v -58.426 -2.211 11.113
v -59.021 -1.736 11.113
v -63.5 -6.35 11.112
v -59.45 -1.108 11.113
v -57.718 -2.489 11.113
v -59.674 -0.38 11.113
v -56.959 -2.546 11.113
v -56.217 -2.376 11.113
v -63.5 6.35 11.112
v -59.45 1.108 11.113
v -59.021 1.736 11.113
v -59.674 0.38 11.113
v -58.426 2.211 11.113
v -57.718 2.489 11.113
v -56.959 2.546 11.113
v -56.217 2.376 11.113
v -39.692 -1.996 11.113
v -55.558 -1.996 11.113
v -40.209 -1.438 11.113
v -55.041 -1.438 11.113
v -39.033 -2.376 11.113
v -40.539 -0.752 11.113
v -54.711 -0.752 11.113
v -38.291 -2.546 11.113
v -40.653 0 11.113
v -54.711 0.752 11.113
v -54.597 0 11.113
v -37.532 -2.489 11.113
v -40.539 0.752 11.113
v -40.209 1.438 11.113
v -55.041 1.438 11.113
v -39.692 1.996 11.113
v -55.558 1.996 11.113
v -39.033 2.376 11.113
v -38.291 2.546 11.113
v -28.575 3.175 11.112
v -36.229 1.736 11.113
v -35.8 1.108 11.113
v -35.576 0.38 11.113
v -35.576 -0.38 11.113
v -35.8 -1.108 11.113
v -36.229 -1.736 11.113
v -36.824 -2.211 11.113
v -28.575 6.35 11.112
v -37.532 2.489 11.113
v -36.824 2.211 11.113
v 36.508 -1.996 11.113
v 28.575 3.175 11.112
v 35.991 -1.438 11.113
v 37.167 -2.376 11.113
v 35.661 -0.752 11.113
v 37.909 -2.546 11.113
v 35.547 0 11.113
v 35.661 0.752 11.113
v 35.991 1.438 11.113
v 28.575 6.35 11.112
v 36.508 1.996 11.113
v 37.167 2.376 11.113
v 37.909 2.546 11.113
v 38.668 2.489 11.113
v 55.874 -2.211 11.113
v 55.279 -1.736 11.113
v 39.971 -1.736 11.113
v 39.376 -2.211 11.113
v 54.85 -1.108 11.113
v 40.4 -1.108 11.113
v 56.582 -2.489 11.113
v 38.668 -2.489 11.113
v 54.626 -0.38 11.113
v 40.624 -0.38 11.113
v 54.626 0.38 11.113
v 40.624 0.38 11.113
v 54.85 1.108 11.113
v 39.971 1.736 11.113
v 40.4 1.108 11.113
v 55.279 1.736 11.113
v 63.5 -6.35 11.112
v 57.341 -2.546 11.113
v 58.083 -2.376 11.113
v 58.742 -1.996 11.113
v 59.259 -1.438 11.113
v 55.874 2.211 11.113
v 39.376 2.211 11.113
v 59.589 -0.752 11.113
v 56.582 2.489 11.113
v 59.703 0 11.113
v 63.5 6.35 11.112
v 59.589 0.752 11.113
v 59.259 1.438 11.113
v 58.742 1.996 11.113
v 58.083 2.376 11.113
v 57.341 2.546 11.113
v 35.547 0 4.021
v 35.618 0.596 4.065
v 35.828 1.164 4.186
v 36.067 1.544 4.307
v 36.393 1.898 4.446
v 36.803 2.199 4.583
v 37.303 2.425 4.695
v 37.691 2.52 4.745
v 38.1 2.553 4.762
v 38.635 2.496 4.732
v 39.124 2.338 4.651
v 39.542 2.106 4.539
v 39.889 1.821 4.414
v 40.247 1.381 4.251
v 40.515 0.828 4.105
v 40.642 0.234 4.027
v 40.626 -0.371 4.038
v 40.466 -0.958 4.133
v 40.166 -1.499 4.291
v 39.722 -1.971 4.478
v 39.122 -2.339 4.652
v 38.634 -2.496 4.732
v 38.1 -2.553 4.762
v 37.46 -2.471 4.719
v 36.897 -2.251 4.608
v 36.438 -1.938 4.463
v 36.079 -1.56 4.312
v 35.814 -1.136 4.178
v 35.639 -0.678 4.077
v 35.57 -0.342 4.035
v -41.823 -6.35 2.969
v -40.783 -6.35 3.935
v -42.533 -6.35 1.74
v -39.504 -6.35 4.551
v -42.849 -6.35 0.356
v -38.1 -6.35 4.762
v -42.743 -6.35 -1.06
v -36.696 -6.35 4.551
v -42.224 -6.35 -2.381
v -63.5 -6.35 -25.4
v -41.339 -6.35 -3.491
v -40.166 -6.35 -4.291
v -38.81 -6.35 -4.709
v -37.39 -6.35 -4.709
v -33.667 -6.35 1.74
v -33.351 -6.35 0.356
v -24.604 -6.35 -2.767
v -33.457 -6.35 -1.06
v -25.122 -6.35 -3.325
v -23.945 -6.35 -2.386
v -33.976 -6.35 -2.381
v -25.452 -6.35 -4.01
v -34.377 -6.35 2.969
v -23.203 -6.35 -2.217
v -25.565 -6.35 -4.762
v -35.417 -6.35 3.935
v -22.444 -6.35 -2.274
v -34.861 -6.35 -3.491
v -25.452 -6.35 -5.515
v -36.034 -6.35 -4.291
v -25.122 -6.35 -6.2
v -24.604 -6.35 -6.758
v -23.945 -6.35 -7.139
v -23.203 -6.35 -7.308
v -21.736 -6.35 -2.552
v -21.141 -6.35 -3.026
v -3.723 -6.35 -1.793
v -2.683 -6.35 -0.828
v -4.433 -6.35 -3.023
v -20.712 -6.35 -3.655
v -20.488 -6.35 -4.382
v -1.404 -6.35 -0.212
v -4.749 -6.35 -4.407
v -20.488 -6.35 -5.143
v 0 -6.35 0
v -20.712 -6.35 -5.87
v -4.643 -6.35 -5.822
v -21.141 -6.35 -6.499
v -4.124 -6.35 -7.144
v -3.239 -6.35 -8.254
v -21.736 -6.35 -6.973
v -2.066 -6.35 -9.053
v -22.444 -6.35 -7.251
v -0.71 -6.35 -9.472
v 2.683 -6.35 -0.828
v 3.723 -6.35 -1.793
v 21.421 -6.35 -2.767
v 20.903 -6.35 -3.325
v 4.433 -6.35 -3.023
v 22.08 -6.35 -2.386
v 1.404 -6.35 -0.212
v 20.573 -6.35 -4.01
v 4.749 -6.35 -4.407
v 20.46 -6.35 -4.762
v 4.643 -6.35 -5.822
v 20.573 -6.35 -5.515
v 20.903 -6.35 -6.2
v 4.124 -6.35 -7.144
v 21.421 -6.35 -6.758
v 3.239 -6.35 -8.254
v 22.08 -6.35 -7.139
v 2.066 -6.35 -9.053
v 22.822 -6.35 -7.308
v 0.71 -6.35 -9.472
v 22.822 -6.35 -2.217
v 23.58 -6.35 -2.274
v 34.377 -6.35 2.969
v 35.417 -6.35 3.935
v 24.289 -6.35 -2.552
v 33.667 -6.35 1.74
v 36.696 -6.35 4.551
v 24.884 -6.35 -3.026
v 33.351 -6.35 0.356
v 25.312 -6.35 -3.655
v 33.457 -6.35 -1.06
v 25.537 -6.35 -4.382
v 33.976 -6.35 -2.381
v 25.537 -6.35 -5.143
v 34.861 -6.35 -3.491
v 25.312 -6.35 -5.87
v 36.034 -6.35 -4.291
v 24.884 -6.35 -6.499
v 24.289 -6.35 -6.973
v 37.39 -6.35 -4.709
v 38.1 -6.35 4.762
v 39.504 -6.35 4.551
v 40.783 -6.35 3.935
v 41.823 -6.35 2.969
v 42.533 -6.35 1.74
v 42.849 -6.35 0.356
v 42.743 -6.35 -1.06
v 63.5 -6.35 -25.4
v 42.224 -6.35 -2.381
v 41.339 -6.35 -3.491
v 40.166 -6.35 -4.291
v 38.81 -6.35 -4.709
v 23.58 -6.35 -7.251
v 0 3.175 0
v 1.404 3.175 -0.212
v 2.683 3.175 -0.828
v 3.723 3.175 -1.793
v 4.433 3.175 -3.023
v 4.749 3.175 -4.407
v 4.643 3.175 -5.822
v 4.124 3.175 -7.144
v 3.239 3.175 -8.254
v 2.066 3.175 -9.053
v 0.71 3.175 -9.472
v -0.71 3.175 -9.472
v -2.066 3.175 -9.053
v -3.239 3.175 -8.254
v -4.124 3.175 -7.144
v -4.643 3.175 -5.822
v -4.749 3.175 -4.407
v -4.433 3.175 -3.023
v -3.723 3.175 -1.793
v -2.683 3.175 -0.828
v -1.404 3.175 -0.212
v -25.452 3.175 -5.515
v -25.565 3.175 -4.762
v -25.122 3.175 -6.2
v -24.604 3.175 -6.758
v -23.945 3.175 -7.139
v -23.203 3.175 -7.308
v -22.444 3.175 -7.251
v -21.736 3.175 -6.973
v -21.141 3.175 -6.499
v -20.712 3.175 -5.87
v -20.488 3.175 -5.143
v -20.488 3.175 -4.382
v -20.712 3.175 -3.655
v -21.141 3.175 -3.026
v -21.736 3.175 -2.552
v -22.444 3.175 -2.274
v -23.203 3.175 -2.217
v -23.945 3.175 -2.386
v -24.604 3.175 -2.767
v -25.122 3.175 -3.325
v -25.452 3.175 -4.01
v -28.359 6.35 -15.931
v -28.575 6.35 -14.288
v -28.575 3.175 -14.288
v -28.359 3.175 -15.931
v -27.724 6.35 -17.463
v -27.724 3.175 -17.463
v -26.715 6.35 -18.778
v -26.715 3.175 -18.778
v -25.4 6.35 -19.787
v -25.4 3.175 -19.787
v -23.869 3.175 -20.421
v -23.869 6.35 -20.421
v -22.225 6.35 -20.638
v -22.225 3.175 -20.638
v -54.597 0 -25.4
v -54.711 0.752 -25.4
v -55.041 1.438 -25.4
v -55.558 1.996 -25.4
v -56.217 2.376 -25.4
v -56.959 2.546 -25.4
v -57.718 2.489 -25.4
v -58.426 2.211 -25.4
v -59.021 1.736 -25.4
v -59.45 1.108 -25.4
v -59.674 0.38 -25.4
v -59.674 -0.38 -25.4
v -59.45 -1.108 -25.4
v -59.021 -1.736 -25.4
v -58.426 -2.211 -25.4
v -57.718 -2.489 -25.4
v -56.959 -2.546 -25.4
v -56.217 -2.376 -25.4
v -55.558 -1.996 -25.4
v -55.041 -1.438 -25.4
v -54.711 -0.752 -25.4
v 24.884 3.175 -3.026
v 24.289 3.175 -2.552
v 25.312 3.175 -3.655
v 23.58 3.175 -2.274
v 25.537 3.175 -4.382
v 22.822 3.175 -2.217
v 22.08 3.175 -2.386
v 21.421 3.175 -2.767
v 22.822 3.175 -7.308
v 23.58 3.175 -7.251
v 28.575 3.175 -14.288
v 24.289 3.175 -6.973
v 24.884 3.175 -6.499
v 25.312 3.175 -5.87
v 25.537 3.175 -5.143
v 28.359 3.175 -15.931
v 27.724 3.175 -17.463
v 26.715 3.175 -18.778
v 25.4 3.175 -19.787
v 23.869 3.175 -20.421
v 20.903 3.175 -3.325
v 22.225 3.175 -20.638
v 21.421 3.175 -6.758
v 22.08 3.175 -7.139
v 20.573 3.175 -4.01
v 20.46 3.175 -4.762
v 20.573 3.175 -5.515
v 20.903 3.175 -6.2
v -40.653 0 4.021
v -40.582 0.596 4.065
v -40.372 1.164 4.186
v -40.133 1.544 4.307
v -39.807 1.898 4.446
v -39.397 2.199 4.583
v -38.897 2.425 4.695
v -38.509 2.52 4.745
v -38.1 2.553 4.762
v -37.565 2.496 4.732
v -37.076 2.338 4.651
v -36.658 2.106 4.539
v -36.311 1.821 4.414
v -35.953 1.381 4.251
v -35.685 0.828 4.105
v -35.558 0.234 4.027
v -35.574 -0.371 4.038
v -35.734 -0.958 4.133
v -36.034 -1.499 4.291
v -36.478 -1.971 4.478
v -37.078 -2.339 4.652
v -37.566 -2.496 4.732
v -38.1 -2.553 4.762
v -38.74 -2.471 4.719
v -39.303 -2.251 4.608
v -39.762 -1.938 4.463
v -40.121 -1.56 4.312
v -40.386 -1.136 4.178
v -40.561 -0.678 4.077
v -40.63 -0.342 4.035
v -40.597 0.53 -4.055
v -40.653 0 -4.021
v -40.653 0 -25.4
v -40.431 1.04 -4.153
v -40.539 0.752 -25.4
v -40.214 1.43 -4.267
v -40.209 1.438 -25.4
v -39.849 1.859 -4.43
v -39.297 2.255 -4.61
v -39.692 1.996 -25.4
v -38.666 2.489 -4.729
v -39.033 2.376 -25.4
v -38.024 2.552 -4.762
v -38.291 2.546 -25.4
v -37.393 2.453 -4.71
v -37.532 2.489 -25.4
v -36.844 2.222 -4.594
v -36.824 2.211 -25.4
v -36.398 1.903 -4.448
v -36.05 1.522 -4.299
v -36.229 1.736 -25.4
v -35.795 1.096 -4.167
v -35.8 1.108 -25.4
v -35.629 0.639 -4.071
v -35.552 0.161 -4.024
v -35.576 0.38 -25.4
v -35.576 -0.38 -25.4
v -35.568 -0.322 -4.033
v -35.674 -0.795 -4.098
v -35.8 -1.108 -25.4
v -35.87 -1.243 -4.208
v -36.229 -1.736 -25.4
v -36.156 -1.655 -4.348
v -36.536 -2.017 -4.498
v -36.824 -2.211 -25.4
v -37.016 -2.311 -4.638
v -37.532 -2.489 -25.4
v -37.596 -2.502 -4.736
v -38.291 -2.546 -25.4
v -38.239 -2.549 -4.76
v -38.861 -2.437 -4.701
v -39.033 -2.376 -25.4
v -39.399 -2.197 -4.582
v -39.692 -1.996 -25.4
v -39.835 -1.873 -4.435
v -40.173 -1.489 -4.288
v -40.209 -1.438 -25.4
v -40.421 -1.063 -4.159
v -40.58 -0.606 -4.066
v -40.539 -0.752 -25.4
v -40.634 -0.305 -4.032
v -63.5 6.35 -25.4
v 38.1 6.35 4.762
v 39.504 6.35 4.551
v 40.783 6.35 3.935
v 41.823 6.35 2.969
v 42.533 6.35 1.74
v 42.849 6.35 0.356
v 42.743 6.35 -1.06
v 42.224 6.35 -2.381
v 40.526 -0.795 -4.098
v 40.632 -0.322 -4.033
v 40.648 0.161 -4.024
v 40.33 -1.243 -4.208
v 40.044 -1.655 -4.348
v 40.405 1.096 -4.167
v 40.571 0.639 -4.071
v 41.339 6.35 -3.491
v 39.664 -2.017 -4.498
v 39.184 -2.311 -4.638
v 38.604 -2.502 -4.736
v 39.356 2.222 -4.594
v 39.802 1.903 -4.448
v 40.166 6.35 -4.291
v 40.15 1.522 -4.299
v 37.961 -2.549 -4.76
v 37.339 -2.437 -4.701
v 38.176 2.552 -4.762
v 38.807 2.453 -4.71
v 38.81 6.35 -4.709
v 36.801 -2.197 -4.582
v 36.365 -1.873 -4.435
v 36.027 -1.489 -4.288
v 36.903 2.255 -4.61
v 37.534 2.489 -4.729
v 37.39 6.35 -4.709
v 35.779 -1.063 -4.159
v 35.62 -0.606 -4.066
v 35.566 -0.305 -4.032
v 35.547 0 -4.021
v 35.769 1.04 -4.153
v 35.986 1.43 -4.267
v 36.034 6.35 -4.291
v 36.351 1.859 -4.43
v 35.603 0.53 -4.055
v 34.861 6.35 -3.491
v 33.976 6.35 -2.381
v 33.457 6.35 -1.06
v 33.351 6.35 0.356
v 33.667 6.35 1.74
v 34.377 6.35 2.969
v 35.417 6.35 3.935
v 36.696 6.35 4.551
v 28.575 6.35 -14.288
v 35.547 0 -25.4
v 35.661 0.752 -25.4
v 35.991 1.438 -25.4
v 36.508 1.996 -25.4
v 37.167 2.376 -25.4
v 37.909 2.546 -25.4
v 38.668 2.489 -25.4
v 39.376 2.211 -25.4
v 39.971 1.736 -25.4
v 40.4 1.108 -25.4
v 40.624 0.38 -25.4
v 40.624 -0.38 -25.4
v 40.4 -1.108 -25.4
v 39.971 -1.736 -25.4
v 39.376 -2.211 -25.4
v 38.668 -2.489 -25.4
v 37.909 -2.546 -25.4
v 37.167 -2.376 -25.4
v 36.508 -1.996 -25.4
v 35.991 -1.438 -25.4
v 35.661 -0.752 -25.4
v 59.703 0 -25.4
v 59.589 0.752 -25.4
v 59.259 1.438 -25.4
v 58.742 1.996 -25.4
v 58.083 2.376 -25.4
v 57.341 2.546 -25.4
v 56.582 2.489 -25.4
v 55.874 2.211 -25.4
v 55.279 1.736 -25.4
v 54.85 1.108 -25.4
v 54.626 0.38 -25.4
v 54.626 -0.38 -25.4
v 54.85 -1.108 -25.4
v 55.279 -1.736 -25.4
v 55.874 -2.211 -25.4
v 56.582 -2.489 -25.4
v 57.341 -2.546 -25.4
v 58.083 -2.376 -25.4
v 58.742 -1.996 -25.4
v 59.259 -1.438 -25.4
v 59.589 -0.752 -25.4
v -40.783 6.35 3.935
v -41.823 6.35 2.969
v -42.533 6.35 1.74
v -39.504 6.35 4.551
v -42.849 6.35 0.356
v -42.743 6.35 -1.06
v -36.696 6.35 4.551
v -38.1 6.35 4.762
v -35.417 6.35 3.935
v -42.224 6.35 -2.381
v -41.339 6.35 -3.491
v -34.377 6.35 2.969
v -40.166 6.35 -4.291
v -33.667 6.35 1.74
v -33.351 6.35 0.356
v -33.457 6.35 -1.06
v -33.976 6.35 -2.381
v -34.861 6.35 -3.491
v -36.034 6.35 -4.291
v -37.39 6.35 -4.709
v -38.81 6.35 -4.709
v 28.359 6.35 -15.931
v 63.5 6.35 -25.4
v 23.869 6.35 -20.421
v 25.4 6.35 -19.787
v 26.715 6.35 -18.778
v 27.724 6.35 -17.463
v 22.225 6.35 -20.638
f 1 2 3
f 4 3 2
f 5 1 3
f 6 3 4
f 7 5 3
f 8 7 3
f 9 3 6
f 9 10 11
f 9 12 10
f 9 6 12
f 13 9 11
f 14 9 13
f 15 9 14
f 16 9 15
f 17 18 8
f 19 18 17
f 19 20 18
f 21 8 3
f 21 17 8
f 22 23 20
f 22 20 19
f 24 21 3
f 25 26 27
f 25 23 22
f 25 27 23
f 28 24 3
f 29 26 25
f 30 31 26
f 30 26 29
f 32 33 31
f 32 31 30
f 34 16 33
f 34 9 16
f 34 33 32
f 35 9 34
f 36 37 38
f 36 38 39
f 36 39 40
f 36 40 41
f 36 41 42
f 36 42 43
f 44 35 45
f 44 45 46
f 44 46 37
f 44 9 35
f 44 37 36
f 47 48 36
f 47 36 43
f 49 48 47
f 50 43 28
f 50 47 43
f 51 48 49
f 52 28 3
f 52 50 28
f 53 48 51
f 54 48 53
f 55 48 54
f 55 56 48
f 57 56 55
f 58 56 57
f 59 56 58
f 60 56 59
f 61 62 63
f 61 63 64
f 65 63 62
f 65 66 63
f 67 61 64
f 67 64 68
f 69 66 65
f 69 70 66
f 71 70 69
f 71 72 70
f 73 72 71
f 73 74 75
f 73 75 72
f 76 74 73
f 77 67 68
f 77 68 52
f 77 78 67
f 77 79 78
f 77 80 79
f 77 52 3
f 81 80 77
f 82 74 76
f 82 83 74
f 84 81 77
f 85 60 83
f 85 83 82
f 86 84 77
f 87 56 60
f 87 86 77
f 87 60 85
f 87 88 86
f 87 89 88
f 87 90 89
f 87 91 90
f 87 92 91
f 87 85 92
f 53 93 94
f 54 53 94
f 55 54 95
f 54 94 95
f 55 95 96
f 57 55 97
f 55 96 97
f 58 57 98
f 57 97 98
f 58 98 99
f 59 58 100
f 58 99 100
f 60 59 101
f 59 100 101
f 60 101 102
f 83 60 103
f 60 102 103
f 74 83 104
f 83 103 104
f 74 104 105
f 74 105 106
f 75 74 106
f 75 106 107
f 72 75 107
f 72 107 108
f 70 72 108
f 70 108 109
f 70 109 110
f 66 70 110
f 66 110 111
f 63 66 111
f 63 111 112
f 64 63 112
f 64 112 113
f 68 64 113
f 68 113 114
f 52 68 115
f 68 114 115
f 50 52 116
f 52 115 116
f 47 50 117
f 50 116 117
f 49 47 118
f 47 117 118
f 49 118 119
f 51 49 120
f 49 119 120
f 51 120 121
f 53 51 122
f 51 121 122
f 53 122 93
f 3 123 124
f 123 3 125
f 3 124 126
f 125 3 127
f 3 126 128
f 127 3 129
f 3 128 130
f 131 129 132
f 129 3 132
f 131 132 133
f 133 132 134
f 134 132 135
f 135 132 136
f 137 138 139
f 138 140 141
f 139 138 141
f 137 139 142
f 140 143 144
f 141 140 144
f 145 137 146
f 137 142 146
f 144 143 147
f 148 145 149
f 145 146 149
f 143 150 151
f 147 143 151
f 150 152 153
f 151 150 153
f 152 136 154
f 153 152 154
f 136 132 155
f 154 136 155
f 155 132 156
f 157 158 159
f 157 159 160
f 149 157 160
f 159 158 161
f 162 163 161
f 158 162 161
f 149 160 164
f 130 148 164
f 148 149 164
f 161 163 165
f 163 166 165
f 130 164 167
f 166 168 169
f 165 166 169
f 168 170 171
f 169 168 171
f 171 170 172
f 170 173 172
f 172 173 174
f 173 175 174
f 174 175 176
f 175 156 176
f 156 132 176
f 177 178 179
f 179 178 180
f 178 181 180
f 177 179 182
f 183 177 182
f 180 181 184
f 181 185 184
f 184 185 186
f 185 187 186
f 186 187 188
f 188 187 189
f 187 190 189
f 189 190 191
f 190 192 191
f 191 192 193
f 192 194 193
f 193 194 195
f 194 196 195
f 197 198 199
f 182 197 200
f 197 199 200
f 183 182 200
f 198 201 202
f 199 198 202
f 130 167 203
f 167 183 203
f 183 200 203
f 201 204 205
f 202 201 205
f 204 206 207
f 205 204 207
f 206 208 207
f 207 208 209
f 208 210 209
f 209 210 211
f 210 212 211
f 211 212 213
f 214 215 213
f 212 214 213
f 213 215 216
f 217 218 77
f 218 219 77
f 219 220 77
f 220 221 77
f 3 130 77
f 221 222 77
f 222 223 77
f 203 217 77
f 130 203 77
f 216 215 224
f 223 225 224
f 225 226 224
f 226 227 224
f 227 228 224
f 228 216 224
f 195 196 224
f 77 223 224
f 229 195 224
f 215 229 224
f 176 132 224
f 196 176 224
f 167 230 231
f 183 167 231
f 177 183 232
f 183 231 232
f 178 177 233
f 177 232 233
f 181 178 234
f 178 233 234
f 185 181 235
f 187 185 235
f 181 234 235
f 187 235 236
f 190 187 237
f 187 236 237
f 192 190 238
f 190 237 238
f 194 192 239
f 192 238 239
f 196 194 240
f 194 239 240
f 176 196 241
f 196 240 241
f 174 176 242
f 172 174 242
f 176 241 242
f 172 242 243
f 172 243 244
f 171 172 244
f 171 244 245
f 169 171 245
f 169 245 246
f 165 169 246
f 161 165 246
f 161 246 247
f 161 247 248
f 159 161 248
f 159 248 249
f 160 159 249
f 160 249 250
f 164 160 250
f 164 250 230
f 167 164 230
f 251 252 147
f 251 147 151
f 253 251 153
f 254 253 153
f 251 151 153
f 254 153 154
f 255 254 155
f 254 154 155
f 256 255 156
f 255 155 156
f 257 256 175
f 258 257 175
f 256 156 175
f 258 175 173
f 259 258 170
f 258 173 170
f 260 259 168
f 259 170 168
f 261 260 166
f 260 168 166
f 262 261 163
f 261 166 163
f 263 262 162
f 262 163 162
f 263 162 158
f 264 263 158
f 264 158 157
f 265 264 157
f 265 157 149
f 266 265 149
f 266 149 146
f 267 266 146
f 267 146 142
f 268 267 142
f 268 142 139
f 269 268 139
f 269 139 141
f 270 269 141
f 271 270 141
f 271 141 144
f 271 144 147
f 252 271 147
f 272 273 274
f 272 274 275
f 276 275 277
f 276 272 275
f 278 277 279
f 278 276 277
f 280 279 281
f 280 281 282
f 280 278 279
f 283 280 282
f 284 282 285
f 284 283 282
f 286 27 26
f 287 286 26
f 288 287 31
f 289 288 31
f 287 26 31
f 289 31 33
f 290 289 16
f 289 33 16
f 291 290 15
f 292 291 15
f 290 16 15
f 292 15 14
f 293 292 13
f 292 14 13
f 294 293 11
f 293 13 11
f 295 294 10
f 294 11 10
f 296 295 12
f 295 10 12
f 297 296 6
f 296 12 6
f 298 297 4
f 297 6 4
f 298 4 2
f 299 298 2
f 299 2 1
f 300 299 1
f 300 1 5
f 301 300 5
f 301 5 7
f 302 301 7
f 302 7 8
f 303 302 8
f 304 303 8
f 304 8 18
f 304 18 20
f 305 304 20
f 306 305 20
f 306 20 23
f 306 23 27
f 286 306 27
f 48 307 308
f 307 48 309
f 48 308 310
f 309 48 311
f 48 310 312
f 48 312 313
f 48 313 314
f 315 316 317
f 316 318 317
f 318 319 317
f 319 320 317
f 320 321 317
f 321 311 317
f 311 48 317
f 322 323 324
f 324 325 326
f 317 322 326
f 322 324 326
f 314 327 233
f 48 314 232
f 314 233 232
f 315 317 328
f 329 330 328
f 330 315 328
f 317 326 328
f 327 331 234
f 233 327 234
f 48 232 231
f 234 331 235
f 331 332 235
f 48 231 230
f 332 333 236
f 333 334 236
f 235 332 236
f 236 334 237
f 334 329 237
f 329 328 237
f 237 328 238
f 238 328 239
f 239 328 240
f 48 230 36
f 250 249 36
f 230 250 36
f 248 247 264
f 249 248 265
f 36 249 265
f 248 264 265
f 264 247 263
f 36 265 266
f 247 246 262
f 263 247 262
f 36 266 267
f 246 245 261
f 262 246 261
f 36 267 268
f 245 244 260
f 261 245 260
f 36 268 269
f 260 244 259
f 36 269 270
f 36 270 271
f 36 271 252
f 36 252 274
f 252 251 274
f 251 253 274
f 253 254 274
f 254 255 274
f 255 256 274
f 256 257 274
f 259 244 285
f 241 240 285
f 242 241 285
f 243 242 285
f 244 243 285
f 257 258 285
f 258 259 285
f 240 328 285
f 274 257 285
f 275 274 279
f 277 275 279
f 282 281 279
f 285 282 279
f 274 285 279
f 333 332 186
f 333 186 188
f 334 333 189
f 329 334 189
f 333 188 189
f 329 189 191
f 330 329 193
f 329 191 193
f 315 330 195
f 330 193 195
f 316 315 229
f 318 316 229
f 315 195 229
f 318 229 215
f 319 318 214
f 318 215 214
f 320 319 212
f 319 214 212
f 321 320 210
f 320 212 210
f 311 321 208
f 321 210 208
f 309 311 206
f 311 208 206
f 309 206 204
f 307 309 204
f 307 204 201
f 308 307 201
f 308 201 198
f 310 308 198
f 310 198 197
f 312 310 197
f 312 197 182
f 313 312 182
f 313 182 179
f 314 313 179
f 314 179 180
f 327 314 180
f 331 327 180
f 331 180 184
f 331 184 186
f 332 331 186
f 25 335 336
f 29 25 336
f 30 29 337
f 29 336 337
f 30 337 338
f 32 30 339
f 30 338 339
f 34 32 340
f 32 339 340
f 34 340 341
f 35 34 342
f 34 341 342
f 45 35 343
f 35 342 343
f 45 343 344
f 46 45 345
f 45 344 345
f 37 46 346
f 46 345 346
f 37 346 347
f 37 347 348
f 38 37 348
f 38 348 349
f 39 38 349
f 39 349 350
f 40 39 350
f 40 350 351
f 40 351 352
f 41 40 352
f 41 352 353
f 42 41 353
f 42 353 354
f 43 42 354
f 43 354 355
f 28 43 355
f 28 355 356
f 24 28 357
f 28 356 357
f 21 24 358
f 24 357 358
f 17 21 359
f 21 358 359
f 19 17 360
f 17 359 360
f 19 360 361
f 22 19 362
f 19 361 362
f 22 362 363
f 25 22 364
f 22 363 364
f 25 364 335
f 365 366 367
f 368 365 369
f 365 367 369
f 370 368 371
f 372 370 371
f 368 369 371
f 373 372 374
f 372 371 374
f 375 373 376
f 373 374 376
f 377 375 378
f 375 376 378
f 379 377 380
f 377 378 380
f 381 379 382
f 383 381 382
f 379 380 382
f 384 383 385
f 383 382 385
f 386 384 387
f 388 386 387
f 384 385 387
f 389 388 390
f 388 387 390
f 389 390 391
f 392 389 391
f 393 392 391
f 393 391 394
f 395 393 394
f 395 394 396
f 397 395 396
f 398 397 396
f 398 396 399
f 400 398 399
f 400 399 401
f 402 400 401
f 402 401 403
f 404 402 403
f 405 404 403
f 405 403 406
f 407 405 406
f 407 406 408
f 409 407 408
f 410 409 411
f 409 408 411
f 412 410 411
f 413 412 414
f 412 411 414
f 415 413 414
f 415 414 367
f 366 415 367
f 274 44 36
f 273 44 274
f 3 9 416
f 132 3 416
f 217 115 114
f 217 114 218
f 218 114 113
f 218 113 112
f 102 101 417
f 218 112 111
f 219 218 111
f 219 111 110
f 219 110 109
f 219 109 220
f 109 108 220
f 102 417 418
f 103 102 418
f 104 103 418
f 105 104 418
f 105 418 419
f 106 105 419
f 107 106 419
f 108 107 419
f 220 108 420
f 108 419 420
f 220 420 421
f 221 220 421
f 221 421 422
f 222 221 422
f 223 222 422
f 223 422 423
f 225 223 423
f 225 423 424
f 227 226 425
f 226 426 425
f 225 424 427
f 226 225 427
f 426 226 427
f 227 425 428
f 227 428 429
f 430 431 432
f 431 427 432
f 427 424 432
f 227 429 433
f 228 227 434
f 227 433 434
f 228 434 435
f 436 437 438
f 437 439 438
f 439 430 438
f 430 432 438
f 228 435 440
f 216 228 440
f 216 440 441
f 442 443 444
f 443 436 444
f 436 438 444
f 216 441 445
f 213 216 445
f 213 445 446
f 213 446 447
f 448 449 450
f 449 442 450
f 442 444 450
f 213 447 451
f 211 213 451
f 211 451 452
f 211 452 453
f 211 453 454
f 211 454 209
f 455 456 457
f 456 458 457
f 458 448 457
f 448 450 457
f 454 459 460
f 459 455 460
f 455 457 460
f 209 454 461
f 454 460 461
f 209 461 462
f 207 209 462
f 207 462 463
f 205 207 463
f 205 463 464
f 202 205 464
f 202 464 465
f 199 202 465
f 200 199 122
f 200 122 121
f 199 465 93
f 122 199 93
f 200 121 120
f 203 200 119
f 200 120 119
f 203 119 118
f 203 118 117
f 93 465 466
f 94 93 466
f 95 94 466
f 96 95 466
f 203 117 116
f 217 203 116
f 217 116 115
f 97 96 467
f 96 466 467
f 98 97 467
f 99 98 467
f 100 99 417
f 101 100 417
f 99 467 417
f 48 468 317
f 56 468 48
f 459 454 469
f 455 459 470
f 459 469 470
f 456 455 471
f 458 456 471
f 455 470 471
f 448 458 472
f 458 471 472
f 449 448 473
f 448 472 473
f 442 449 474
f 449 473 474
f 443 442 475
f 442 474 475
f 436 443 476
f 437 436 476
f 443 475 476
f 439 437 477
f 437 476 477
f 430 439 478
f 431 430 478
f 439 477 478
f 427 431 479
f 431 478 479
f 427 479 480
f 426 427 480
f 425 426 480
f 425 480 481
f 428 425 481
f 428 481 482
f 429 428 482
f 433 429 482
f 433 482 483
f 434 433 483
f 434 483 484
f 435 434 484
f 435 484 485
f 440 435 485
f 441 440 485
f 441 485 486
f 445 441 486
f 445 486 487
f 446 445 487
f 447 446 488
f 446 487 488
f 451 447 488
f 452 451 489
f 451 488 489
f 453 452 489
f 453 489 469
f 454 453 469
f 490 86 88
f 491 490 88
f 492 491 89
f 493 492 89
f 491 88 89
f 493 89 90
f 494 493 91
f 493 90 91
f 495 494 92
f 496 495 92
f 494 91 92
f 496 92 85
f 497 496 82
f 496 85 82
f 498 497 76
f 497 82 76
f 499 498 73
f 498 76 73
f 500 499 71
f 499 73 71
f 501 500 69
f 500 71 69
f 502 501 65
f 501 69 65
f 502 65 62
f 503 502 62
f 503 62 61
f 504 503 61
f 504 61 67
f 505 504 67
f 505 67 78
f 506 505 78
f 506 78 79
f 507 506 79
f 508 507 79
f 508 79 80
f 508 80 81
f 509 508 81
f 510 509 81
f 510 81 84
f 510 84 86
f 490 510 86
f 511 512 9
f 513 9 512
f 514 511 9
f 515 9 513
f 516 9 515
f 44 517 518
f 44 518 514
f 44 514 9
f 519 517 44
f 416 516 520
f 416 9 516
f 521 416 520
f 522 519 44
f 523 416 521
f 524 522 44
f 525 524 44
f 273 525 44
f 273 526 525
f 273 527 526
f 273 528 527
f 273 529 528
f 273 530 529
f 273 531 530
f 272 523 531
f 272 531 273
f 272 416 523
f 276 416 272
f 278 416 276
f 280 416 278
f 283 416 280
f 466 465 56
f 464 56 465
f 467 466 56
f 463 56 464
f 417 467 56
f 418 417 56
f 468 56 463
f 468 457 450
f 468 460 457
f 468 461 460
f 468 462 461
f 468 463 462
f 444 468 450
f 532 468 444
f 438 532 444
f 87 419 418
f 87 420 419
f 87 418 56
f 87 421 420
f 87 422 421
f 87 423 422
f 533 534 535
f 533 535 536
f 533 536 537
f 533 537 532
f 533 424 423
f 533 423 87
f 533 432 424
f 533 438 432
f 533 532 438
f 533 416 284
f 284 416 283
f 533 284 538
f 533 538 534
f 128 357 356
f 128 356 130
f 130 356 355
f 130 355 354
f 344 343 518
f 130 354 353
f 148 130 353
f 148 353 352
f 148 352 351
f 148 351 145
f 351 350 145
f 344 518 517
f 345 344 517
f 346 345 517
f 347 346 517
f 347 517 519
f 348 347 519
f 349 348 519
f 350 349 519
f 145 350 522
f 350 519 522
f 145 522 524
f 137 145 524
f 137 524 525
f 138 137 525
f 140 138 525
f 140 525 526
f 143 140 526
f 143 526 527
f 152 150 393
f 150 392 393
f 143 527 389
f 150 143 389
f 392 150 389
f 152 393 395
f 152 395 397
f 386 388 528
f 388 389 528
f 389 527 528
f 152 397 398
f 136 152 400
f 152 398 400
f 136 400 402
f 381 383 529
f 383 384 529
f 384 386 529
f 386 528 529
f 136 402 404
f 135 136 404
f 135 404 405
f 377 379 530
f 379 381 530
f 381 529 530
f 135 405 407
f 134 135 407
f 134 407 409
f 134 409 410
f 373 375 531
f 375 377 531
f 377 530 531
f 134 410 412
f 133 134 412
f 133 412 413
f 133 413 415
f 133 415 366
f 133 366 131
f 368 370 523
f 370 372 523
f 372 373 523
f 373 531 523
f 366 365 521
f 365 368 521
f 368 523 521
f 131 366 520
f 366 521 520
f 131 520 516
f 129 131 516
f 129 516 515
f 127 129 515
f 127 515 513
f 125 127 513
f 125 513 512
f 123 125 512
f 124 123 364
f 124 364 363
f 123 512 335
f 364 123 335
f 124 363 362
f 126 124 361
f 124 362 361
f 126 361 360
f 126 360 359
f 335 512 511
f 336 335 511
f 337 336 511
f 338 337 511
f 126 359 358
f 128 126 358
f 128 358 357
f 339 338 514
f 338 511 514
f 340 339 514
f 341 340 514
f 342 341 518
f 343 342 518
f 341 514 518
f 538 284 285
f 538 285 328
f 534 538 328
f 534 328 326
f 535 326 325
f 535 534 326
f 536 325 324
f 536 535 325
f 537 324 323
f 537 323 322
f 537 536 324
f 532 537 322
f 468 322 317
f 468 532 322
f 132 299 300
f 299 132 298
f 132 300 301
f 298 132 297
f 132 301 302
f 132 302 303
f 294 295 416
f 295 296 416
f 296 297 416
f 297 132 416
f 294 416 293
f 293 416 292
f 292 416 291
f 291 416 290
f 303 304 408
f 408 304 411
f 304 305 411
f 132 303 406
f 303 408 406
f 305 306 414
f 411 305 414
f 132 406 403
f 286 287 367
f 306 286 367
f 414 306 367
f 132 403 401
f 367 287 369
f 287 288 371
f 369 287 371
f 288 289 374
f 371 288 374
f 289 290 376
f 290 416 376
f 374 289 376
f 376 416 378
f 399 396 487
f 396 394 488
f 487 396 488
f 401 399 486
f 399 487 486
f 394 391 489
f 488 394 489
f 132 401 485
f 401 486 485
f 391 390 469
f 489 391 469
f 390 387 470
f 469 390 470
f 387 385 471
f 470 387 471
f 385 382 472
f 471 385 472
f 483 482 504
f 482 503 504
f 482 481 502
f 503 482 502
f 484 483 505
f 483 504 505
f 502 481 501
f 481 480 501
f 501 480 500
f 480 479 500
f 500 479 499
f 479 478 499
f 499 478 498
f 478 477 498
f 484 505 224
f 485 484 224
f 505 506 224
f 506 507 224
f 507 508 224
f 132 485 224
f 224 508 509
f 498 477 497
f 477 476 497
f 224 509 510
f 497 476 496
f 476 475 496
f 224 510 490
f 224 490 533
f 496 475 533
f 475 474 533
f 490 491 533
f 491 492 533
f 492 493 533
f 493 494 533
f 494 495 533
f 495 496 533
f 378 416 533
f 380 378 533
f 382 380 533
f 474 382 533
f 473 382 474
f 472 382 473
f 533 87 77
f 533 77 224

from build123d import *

# Parameters (mm, degrees)
SKETCH1_W                         = 127
SKETCH1_H                         = 50.8
BOSS_EXTRUDE1_DEPTH               = 6.35
TAPPED_HOLE_FOR_10_32_HELICOIL1_D = 5.1054
SKETCH7_W                         = 127
SKETCH7_H                         = 14.2875
CUT_EXTRUDE2_DEPTH                = 70.560764803
TAPPED_HOLE_FOR_10_32_HELICOIL3_D = 5.1054
SKETCH4_R                         = 4.7625
CUT_EXTRUDE1_DEPTH                = 70.560764803
CUT_EXTRUDE4_DEPTH                = 3.175
F_10_CLEARANCE_HOLE3_D            = 5.1054
F_10_CLEARANCE_HOLE3_DEPTH        = 12.7
F_10_CLEARANCE_HOLE3_TIP          = 1.533816902


with BuildPart() as part:
    # Sketch1 → Boss-Extrude1 (new, symmetric)
    with BuildSketch(Plane(origin=(0, 0, 0), x_dir=(1, 0, 0), z_dir=(0, 1, 0))):
        Rectangle(SKETCH1_W, SKETCH1_H)
    extrude(amount=BOSS_EXTRUDE1_DEPTH, both=True)

    # Tapped Hole for #10-32 Helicoil1 (through all)
    with Locations(Plane(origin=(0, 0, -25.4), x_dir=(-1, 0, 0), z_dir=(0, 0, -1))):
        with Locations((-57.15, 0), (57.15, 0)):
            Hole(TAPPED_HOLE_FOR_10_32_HELICOIL1_D / 2)

    # Sketch7 → Cut-Extrude2 (cut, through all)
    with BuildSketch(Plane(origin=(0, 6.35, 0), x_dir=(1, 0, 0), z_dir=(0, 1, 0))):
        with Locations((0, -18.25625)):
            Rectangle(SKETCH7_W, SKETCH7_H)
    extrude(amount=-CUT_EXTRUDE2_DEPTH, mode=Mode.SUBTRACT)

    # Tapped Hole for #10-32 Helicoil3 (through all)
    with Locations(Plane.XY.offset(11.1125)):
        with Locations((-38.1, 0), (38.1, 0)):
            Hole(TAPPED_HOLE_FOR_10_32_HELICOIL3_D / 2)

    # Sketch4 → Cut-Extrude1 (cut, through all)
    with BuildSketch(Plane(origin=(0, 6.35, 0), x_dir=(1, 0, 0), z_dir=(0, 1, 0))):
        with Locations(Location((-38.1, 0, 0), (0, 0, 270))):
            Circle(SKETCH4_R)
        with Locations(Location((38.1, 0, 0), (0, 0, 270))):
            Circle(SKETCH4_R)
        with Locations(Location((0, 4.7625, 0), (0, 0, 270))):
            Circle(SKETCH4_R)
    extrude(amount=-CUT_EXTRUDE1_DEPTH, mode=Mode.SUBTRACT)

    # Sketch11 → Cut-Extrude4 (cut)
    with BuildSketch(Plane(origin=(0, 6.35, 0), x_dir=(1, 0, 0), z_dir=(0, 1, 0))):
        with BuildLine():
            Line((-22.225, 20.6375), (22.225, 20.6375))
            ThreePointArc((22.225, 20.6375), (26.715128061, 18.777628061), (28.575, 14.2875))
            Line((28.575, 14.2875), (28.575, -11.1125))
            Line((28.575, -11.1125), (-28.575, -11.1125))
            Line((-28.575, -11.1125), (-28.575, 14.2875))
            ThreePointArc((-28.575, 14.2875), (-26.715128061, 18.777628061), (-22.225, 20.6375))
        make_face()
    extrude(amount=-CUT_EXTRUDE4_DEPTH, mode=Mode.SUBTRACT)

    # #10 Clearance Hole3
    with Locations(Plane(origin=(0, 3.175, 0), x_dir=(1, 0, 0), z_dir=(0, 1, 0))):
        with Locations((-23.0124, 4.7625), (23.0124, 4.7625)):
            Hole(F_10_CLEARANCE_HOLE3_D / 2, depth=F_10_CLEARANCE_HOLE3_DEPTH)
            with Locations((0, 0, -(F_10_CLEARANCE_HOLE3_DEPTH + F_10_CLEARANCE_HOLE3_TIP / 2))):  # 118° drill point
                Cone(0, F_10_CLEARANCE_HOLE3_D / 2, F_10_CLEARANCE_HOLE3_TIP, mode=Mode.SUBTRACT)


solid = part.part
